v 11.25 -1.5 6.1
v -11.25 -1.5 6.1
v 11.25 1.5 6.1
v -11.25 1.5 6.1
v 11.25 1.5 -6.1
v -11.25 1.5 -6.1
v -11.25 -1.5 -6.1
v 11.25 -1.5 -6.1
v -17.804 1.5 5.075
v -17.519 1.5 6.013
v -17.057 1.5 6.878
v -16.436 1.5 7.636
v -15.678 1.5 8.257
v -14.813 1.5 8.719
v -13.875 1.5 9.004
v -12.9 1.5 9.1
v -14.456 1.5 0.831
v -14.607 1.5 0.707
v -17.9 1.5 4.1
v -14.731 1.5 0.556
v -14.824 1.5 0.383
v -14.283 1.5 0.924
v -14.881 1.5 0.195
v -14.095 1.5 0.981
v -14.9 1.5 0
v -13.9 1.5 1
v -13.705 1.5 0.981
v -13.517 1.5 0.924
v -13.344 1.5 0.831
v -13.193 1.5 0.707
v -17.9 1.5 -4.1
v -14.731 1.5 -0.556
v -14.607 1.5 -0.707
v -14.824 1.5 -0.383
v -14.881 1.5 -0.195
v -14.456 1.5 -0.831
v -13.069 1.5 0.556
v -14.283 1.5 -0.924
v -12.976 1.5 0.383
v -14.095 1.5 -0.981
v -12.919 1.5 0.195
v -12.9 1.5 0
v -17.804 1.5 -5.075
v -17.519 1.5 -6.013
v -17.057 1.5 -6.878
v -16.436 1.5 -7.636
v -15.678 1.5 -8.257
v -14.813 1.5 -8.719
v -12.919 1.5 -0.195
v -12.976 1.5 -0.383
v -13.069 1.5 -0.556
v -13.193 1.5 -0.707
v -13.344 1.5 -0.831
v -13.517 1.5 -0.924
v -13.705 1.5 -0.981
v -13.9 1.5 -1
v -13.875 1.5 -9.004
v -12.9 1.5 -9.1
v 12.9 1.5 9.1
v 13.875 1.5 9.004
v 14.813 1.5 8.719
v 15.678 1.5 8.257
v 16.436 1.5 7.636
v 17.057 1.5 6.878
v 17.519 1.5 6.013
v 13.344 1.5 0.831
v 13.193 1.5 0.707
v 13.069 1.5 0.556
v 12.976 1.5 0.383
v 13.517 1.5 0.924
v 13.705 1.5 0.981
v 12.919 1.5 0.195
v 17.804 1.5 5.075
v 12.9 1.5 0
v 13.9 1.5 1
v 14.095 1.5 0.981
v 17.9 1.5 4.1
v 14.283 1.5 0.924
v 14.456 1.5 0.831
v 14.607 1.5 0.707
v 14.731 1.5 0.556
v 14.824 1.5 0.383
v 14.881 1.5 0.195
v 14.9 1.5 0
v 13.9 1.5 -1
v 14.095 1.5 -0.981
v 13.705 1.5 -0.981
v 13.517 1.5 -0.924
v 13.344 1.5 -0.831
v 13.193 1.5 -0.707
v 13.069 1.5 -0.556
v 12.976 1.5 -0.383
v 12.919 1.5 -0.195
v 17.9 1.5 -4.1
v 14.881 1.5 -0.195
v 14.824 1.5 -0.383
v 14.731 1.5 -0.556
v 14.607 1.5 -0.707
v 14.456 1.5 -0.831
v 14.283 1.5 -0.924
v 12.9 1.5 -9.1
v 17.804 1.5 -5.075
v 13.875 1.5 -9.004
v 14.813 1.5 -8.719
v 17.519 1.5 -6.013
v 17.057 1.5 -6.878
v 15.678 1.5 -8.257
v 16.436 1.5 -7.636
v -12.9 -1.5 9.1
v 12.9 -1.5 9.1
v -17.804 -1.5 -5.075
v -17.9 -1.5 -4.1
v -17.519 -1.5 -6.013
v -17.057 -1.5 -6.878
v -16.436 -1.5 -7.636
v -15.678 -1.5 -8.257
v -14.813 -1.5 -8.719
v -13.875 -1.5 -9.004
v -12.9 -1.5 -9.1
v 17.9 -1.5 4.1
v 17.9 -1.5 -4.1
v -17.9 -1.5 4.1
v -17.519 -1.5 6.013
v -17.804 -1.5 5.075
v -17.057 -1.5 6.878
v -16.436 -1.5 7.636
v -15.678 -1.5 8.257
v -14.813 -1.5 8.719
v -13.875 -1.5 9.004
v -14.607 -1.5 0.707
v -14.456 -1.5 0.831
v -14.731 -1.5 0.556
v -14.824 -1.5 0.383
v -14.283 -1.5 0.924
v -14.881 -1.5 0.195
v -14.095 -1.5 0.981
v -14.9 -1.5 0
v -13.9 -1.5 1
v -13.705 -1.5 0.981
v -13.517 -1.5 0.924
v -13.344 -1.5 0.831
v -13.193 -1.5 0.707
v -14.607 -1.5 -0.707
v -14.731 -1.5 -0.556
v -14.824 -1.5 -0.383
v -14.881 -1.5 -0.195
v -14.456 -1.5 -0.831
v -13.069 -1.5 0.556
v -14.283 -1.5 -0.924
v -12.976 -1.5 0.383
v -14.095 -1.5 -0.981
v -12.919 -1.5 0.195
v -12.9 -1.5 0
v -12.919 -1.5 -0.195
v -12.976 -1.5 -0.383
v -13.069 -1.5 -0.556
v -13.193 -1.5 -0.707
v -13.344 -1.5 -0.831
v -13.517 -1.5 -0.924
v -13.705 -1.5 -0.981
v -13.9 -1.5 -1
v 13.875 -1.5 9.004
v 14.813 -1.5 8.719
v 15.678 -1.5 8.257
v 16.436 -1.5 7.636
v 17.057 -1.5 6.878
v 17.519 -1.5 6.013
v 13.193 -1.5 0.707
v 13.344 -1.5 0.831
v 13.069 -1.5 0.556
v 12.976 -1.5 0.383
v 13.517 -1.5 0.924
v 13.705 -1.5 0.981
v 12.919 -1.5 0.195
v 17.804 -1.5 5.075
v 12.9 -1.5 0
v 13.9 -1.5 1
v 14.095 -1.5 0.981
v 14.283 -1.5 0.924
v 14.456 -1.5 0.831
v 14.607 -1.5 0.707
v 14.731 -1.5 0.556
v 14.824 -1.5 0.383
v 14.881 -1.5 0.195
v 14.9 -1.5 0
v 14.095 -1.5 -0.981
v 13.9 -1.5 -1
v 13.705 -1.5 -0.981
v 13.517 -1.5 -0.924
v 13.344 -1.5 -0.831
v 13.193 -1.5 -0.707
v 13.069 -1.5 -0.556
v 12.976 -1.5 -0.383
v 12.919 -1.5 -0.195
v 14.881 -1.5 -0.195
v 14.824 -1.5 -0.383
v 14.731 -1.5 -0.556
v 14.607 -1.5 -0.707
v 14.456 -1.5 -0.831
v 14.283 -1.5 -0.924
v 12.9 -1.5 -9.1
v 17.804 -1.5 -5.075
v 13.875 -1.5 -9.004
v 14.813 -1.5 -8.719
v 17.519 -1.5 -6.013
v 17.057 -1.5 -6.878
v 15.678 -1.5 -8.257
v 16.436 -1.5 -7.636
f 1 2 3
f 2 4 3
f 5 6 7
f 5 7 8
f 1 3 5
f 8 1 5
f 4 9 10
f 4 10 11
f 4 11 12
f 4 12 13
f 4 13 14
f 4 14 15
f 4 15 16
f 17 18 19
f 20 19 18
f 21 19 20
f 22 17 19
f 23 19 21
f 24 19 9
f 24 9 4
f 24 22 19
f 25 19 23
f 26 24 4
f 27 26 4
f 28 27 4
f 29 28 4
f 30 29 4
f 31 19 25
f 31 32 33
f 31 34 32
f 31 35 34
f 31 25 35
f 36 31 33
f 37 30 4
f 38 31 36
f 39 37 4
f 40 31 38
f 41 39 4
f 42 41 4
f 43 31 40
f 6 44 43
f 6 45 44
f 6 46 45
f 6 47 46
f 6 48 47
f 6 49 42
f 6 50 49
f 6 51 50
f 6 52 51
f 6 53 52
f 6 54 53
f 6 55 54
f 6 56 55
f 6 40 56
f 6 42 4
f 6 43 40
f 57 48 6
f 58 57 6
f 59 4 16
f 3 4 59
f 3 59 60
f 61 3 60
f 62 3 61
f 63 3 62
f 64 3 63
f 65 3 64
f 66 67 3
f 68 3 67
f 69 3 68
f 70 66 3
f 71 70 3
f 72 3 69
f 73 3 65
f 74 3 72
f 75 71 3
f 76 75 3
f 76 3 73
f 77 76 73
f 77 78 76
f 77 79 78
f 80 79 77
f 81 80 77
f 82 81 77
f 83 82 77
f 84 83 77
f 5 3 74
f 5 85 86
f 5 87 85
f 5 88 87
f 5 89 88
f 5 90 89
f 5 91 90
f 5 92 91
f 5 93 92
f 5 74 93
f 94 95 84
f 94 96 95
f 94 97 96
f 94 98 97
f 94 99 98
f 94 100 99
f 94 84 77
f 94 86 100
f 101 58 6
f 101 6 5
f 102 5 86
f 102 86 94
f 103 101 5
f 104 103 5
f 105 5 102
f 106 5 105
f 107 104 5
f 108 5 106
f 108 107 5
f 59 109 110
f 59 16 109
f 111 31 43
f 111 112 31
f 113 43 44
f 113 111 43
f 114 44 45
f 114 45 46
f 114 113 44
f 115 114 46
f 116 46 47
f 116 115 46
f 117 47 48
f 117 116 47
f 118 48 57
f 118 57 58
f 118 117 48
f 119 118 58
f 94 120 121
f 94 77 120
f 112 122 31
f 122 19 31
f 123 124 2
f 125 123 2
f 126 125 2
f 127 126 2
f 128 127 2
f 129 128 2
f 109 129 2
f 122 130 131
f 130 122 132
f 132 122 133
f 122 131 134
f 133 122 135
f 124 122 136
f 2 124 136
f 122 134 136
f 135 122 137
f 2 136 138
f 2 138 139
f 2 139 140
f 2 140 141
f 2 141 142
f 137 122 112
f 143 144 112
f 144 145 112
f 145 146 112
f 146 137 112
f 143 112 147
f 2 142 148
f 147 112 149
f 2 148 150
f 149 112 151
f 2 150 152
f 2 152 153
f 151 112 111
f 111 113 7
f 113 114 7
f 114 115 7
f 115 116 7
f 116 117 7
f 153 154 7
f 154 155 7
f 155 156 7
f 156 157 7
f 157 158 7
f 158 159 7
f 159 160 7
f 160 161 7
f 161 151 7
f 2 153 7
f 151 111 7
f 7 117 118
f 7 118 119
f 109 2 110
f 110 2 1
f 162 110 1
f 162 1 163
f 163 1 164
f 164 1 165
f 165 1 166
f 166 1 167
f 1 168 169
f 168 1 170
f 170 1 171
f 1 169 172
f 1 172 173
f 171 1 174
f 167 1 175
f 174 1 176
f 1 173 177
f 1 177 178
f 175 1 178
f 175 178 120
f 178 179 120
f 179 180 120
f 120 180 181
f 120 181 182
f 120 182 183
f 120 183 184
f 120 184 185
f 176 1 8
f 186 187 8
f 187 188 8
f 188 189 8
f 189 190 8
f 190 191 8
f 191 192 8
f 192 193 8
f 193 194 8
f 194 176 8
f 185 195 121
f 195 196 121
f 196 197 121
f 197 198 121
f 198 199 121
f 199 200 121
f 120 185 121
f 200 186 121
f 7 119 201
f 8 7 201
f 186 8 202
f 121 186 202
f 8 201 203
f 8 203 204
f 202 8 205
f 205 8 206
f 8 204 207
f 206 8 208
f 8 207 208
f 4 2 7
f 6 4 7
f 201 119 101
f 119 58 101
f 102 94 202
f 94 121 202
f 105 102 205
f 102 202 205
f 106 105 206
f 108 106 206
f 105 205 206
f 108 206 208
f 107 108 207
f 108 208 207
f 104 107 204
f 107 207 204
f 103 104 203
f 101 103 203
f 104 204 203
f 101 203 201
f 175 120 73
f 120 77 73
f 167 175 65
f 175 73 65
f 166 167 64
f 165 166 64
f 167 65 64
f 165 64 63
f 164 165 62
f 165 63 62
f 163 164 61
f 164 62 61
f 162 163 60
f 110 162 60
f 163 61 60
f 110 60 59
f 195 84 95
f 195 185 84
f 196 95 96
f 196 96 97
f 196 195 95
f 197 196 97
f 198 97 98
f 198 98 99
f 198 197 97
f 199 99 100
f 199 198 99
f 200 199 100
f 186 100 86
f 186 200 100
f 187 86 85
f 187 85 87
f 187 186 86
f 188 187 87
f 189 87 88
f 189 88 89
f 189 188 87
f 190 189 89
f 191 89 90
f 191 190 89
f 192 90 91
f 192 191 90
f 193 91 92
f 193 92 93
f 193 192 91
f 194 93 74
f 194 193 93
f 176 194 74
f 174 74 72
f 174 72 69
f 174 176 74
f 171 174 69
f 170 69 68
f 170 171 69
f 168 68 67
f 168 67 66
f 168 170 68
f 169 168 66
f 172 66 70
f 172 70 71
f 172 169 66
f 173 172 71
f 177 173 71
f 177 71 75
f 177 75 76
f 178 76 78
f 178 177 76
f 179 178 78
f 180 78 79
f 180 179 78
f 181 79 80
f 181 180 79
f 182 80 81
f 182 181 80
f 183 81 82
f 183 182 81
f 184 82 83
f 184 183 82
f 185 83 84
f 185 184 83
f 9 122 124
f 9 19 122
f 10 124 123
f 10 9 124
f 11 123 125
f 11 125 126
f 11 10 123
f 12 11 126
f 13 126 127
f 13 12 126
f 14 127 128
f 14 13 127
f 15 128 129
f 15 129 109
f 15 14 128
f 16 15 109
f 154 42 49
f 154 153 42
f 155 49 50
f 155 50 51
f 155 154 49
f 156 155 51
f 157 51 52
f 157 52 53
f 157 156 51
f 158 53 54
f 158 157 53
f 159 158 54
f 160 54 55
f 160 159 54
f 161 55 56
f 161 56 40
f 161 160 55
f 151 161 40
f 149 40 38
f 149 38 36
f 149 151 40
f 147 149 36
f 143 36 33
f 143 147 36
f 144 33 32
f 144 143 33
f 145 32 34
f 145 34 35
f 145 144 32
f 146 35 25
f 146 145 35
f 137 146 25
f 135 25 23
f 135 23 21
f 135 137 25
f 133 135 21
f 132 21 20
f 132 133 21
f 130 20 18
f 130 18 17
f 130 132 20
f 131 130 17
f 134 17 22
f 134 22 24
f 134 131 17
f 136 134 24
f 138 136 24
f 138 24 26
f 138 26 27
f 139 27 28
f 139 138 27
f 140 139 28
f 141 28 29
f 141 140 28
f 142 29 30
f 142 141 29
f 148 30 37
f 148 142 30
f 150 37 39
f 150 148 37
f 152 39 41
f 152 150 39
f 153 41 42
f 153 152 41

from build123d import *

# Parameters (mm, degrees)
SKETCH1_W           = 35.8
SKETCH1_H           = 18.2
SKETCH1_R           = 1
SKETCH1_W_2         = 22.5
SKETCH1_H_2         = 12.2
BOSS_EXTRUDE1_DEPTH = 1.5
FILLET1_R           = 5


with BuildPart() as part:
    # Sketch1 → Boss-Extrude1 (new body, symmetric)
    with BuildSketch(Plane(origin=(0, 0, 0), x_dir=(1, 0, 0), z_dir=(0, 1, 0))):
        Rectangle(SKETCH1_W, SKETCH1_H)
        with Locations((-13.9, 0)):
            Circle(SKETCH1_R, mode=Mode.SUBTRACT)
        with Locations((13.9, 0)):
            Circle(SKETCH1_R, mode=Mode.SUBTRACT)
        Rectangle(SKETCH1_W_2, SKETCH1_H_2, mode=Mode.SUBTRACT)
    extrude(amount=BOSS_EXTRUDE1_DEPTH, both=True)

    # Fillet1
    fillet1_edges = [part.edges().sort_by_distance(p)[0] for p in [
        (-17.9, 0, -9.1),
        (17.9, 0, -9.1),
        (17.9, 0, 9.1),
        (-17.9, 0, 9.1),
    ]]
    fillet(fillet1_edges, radius=FILLET1_R)


solid = part.part
